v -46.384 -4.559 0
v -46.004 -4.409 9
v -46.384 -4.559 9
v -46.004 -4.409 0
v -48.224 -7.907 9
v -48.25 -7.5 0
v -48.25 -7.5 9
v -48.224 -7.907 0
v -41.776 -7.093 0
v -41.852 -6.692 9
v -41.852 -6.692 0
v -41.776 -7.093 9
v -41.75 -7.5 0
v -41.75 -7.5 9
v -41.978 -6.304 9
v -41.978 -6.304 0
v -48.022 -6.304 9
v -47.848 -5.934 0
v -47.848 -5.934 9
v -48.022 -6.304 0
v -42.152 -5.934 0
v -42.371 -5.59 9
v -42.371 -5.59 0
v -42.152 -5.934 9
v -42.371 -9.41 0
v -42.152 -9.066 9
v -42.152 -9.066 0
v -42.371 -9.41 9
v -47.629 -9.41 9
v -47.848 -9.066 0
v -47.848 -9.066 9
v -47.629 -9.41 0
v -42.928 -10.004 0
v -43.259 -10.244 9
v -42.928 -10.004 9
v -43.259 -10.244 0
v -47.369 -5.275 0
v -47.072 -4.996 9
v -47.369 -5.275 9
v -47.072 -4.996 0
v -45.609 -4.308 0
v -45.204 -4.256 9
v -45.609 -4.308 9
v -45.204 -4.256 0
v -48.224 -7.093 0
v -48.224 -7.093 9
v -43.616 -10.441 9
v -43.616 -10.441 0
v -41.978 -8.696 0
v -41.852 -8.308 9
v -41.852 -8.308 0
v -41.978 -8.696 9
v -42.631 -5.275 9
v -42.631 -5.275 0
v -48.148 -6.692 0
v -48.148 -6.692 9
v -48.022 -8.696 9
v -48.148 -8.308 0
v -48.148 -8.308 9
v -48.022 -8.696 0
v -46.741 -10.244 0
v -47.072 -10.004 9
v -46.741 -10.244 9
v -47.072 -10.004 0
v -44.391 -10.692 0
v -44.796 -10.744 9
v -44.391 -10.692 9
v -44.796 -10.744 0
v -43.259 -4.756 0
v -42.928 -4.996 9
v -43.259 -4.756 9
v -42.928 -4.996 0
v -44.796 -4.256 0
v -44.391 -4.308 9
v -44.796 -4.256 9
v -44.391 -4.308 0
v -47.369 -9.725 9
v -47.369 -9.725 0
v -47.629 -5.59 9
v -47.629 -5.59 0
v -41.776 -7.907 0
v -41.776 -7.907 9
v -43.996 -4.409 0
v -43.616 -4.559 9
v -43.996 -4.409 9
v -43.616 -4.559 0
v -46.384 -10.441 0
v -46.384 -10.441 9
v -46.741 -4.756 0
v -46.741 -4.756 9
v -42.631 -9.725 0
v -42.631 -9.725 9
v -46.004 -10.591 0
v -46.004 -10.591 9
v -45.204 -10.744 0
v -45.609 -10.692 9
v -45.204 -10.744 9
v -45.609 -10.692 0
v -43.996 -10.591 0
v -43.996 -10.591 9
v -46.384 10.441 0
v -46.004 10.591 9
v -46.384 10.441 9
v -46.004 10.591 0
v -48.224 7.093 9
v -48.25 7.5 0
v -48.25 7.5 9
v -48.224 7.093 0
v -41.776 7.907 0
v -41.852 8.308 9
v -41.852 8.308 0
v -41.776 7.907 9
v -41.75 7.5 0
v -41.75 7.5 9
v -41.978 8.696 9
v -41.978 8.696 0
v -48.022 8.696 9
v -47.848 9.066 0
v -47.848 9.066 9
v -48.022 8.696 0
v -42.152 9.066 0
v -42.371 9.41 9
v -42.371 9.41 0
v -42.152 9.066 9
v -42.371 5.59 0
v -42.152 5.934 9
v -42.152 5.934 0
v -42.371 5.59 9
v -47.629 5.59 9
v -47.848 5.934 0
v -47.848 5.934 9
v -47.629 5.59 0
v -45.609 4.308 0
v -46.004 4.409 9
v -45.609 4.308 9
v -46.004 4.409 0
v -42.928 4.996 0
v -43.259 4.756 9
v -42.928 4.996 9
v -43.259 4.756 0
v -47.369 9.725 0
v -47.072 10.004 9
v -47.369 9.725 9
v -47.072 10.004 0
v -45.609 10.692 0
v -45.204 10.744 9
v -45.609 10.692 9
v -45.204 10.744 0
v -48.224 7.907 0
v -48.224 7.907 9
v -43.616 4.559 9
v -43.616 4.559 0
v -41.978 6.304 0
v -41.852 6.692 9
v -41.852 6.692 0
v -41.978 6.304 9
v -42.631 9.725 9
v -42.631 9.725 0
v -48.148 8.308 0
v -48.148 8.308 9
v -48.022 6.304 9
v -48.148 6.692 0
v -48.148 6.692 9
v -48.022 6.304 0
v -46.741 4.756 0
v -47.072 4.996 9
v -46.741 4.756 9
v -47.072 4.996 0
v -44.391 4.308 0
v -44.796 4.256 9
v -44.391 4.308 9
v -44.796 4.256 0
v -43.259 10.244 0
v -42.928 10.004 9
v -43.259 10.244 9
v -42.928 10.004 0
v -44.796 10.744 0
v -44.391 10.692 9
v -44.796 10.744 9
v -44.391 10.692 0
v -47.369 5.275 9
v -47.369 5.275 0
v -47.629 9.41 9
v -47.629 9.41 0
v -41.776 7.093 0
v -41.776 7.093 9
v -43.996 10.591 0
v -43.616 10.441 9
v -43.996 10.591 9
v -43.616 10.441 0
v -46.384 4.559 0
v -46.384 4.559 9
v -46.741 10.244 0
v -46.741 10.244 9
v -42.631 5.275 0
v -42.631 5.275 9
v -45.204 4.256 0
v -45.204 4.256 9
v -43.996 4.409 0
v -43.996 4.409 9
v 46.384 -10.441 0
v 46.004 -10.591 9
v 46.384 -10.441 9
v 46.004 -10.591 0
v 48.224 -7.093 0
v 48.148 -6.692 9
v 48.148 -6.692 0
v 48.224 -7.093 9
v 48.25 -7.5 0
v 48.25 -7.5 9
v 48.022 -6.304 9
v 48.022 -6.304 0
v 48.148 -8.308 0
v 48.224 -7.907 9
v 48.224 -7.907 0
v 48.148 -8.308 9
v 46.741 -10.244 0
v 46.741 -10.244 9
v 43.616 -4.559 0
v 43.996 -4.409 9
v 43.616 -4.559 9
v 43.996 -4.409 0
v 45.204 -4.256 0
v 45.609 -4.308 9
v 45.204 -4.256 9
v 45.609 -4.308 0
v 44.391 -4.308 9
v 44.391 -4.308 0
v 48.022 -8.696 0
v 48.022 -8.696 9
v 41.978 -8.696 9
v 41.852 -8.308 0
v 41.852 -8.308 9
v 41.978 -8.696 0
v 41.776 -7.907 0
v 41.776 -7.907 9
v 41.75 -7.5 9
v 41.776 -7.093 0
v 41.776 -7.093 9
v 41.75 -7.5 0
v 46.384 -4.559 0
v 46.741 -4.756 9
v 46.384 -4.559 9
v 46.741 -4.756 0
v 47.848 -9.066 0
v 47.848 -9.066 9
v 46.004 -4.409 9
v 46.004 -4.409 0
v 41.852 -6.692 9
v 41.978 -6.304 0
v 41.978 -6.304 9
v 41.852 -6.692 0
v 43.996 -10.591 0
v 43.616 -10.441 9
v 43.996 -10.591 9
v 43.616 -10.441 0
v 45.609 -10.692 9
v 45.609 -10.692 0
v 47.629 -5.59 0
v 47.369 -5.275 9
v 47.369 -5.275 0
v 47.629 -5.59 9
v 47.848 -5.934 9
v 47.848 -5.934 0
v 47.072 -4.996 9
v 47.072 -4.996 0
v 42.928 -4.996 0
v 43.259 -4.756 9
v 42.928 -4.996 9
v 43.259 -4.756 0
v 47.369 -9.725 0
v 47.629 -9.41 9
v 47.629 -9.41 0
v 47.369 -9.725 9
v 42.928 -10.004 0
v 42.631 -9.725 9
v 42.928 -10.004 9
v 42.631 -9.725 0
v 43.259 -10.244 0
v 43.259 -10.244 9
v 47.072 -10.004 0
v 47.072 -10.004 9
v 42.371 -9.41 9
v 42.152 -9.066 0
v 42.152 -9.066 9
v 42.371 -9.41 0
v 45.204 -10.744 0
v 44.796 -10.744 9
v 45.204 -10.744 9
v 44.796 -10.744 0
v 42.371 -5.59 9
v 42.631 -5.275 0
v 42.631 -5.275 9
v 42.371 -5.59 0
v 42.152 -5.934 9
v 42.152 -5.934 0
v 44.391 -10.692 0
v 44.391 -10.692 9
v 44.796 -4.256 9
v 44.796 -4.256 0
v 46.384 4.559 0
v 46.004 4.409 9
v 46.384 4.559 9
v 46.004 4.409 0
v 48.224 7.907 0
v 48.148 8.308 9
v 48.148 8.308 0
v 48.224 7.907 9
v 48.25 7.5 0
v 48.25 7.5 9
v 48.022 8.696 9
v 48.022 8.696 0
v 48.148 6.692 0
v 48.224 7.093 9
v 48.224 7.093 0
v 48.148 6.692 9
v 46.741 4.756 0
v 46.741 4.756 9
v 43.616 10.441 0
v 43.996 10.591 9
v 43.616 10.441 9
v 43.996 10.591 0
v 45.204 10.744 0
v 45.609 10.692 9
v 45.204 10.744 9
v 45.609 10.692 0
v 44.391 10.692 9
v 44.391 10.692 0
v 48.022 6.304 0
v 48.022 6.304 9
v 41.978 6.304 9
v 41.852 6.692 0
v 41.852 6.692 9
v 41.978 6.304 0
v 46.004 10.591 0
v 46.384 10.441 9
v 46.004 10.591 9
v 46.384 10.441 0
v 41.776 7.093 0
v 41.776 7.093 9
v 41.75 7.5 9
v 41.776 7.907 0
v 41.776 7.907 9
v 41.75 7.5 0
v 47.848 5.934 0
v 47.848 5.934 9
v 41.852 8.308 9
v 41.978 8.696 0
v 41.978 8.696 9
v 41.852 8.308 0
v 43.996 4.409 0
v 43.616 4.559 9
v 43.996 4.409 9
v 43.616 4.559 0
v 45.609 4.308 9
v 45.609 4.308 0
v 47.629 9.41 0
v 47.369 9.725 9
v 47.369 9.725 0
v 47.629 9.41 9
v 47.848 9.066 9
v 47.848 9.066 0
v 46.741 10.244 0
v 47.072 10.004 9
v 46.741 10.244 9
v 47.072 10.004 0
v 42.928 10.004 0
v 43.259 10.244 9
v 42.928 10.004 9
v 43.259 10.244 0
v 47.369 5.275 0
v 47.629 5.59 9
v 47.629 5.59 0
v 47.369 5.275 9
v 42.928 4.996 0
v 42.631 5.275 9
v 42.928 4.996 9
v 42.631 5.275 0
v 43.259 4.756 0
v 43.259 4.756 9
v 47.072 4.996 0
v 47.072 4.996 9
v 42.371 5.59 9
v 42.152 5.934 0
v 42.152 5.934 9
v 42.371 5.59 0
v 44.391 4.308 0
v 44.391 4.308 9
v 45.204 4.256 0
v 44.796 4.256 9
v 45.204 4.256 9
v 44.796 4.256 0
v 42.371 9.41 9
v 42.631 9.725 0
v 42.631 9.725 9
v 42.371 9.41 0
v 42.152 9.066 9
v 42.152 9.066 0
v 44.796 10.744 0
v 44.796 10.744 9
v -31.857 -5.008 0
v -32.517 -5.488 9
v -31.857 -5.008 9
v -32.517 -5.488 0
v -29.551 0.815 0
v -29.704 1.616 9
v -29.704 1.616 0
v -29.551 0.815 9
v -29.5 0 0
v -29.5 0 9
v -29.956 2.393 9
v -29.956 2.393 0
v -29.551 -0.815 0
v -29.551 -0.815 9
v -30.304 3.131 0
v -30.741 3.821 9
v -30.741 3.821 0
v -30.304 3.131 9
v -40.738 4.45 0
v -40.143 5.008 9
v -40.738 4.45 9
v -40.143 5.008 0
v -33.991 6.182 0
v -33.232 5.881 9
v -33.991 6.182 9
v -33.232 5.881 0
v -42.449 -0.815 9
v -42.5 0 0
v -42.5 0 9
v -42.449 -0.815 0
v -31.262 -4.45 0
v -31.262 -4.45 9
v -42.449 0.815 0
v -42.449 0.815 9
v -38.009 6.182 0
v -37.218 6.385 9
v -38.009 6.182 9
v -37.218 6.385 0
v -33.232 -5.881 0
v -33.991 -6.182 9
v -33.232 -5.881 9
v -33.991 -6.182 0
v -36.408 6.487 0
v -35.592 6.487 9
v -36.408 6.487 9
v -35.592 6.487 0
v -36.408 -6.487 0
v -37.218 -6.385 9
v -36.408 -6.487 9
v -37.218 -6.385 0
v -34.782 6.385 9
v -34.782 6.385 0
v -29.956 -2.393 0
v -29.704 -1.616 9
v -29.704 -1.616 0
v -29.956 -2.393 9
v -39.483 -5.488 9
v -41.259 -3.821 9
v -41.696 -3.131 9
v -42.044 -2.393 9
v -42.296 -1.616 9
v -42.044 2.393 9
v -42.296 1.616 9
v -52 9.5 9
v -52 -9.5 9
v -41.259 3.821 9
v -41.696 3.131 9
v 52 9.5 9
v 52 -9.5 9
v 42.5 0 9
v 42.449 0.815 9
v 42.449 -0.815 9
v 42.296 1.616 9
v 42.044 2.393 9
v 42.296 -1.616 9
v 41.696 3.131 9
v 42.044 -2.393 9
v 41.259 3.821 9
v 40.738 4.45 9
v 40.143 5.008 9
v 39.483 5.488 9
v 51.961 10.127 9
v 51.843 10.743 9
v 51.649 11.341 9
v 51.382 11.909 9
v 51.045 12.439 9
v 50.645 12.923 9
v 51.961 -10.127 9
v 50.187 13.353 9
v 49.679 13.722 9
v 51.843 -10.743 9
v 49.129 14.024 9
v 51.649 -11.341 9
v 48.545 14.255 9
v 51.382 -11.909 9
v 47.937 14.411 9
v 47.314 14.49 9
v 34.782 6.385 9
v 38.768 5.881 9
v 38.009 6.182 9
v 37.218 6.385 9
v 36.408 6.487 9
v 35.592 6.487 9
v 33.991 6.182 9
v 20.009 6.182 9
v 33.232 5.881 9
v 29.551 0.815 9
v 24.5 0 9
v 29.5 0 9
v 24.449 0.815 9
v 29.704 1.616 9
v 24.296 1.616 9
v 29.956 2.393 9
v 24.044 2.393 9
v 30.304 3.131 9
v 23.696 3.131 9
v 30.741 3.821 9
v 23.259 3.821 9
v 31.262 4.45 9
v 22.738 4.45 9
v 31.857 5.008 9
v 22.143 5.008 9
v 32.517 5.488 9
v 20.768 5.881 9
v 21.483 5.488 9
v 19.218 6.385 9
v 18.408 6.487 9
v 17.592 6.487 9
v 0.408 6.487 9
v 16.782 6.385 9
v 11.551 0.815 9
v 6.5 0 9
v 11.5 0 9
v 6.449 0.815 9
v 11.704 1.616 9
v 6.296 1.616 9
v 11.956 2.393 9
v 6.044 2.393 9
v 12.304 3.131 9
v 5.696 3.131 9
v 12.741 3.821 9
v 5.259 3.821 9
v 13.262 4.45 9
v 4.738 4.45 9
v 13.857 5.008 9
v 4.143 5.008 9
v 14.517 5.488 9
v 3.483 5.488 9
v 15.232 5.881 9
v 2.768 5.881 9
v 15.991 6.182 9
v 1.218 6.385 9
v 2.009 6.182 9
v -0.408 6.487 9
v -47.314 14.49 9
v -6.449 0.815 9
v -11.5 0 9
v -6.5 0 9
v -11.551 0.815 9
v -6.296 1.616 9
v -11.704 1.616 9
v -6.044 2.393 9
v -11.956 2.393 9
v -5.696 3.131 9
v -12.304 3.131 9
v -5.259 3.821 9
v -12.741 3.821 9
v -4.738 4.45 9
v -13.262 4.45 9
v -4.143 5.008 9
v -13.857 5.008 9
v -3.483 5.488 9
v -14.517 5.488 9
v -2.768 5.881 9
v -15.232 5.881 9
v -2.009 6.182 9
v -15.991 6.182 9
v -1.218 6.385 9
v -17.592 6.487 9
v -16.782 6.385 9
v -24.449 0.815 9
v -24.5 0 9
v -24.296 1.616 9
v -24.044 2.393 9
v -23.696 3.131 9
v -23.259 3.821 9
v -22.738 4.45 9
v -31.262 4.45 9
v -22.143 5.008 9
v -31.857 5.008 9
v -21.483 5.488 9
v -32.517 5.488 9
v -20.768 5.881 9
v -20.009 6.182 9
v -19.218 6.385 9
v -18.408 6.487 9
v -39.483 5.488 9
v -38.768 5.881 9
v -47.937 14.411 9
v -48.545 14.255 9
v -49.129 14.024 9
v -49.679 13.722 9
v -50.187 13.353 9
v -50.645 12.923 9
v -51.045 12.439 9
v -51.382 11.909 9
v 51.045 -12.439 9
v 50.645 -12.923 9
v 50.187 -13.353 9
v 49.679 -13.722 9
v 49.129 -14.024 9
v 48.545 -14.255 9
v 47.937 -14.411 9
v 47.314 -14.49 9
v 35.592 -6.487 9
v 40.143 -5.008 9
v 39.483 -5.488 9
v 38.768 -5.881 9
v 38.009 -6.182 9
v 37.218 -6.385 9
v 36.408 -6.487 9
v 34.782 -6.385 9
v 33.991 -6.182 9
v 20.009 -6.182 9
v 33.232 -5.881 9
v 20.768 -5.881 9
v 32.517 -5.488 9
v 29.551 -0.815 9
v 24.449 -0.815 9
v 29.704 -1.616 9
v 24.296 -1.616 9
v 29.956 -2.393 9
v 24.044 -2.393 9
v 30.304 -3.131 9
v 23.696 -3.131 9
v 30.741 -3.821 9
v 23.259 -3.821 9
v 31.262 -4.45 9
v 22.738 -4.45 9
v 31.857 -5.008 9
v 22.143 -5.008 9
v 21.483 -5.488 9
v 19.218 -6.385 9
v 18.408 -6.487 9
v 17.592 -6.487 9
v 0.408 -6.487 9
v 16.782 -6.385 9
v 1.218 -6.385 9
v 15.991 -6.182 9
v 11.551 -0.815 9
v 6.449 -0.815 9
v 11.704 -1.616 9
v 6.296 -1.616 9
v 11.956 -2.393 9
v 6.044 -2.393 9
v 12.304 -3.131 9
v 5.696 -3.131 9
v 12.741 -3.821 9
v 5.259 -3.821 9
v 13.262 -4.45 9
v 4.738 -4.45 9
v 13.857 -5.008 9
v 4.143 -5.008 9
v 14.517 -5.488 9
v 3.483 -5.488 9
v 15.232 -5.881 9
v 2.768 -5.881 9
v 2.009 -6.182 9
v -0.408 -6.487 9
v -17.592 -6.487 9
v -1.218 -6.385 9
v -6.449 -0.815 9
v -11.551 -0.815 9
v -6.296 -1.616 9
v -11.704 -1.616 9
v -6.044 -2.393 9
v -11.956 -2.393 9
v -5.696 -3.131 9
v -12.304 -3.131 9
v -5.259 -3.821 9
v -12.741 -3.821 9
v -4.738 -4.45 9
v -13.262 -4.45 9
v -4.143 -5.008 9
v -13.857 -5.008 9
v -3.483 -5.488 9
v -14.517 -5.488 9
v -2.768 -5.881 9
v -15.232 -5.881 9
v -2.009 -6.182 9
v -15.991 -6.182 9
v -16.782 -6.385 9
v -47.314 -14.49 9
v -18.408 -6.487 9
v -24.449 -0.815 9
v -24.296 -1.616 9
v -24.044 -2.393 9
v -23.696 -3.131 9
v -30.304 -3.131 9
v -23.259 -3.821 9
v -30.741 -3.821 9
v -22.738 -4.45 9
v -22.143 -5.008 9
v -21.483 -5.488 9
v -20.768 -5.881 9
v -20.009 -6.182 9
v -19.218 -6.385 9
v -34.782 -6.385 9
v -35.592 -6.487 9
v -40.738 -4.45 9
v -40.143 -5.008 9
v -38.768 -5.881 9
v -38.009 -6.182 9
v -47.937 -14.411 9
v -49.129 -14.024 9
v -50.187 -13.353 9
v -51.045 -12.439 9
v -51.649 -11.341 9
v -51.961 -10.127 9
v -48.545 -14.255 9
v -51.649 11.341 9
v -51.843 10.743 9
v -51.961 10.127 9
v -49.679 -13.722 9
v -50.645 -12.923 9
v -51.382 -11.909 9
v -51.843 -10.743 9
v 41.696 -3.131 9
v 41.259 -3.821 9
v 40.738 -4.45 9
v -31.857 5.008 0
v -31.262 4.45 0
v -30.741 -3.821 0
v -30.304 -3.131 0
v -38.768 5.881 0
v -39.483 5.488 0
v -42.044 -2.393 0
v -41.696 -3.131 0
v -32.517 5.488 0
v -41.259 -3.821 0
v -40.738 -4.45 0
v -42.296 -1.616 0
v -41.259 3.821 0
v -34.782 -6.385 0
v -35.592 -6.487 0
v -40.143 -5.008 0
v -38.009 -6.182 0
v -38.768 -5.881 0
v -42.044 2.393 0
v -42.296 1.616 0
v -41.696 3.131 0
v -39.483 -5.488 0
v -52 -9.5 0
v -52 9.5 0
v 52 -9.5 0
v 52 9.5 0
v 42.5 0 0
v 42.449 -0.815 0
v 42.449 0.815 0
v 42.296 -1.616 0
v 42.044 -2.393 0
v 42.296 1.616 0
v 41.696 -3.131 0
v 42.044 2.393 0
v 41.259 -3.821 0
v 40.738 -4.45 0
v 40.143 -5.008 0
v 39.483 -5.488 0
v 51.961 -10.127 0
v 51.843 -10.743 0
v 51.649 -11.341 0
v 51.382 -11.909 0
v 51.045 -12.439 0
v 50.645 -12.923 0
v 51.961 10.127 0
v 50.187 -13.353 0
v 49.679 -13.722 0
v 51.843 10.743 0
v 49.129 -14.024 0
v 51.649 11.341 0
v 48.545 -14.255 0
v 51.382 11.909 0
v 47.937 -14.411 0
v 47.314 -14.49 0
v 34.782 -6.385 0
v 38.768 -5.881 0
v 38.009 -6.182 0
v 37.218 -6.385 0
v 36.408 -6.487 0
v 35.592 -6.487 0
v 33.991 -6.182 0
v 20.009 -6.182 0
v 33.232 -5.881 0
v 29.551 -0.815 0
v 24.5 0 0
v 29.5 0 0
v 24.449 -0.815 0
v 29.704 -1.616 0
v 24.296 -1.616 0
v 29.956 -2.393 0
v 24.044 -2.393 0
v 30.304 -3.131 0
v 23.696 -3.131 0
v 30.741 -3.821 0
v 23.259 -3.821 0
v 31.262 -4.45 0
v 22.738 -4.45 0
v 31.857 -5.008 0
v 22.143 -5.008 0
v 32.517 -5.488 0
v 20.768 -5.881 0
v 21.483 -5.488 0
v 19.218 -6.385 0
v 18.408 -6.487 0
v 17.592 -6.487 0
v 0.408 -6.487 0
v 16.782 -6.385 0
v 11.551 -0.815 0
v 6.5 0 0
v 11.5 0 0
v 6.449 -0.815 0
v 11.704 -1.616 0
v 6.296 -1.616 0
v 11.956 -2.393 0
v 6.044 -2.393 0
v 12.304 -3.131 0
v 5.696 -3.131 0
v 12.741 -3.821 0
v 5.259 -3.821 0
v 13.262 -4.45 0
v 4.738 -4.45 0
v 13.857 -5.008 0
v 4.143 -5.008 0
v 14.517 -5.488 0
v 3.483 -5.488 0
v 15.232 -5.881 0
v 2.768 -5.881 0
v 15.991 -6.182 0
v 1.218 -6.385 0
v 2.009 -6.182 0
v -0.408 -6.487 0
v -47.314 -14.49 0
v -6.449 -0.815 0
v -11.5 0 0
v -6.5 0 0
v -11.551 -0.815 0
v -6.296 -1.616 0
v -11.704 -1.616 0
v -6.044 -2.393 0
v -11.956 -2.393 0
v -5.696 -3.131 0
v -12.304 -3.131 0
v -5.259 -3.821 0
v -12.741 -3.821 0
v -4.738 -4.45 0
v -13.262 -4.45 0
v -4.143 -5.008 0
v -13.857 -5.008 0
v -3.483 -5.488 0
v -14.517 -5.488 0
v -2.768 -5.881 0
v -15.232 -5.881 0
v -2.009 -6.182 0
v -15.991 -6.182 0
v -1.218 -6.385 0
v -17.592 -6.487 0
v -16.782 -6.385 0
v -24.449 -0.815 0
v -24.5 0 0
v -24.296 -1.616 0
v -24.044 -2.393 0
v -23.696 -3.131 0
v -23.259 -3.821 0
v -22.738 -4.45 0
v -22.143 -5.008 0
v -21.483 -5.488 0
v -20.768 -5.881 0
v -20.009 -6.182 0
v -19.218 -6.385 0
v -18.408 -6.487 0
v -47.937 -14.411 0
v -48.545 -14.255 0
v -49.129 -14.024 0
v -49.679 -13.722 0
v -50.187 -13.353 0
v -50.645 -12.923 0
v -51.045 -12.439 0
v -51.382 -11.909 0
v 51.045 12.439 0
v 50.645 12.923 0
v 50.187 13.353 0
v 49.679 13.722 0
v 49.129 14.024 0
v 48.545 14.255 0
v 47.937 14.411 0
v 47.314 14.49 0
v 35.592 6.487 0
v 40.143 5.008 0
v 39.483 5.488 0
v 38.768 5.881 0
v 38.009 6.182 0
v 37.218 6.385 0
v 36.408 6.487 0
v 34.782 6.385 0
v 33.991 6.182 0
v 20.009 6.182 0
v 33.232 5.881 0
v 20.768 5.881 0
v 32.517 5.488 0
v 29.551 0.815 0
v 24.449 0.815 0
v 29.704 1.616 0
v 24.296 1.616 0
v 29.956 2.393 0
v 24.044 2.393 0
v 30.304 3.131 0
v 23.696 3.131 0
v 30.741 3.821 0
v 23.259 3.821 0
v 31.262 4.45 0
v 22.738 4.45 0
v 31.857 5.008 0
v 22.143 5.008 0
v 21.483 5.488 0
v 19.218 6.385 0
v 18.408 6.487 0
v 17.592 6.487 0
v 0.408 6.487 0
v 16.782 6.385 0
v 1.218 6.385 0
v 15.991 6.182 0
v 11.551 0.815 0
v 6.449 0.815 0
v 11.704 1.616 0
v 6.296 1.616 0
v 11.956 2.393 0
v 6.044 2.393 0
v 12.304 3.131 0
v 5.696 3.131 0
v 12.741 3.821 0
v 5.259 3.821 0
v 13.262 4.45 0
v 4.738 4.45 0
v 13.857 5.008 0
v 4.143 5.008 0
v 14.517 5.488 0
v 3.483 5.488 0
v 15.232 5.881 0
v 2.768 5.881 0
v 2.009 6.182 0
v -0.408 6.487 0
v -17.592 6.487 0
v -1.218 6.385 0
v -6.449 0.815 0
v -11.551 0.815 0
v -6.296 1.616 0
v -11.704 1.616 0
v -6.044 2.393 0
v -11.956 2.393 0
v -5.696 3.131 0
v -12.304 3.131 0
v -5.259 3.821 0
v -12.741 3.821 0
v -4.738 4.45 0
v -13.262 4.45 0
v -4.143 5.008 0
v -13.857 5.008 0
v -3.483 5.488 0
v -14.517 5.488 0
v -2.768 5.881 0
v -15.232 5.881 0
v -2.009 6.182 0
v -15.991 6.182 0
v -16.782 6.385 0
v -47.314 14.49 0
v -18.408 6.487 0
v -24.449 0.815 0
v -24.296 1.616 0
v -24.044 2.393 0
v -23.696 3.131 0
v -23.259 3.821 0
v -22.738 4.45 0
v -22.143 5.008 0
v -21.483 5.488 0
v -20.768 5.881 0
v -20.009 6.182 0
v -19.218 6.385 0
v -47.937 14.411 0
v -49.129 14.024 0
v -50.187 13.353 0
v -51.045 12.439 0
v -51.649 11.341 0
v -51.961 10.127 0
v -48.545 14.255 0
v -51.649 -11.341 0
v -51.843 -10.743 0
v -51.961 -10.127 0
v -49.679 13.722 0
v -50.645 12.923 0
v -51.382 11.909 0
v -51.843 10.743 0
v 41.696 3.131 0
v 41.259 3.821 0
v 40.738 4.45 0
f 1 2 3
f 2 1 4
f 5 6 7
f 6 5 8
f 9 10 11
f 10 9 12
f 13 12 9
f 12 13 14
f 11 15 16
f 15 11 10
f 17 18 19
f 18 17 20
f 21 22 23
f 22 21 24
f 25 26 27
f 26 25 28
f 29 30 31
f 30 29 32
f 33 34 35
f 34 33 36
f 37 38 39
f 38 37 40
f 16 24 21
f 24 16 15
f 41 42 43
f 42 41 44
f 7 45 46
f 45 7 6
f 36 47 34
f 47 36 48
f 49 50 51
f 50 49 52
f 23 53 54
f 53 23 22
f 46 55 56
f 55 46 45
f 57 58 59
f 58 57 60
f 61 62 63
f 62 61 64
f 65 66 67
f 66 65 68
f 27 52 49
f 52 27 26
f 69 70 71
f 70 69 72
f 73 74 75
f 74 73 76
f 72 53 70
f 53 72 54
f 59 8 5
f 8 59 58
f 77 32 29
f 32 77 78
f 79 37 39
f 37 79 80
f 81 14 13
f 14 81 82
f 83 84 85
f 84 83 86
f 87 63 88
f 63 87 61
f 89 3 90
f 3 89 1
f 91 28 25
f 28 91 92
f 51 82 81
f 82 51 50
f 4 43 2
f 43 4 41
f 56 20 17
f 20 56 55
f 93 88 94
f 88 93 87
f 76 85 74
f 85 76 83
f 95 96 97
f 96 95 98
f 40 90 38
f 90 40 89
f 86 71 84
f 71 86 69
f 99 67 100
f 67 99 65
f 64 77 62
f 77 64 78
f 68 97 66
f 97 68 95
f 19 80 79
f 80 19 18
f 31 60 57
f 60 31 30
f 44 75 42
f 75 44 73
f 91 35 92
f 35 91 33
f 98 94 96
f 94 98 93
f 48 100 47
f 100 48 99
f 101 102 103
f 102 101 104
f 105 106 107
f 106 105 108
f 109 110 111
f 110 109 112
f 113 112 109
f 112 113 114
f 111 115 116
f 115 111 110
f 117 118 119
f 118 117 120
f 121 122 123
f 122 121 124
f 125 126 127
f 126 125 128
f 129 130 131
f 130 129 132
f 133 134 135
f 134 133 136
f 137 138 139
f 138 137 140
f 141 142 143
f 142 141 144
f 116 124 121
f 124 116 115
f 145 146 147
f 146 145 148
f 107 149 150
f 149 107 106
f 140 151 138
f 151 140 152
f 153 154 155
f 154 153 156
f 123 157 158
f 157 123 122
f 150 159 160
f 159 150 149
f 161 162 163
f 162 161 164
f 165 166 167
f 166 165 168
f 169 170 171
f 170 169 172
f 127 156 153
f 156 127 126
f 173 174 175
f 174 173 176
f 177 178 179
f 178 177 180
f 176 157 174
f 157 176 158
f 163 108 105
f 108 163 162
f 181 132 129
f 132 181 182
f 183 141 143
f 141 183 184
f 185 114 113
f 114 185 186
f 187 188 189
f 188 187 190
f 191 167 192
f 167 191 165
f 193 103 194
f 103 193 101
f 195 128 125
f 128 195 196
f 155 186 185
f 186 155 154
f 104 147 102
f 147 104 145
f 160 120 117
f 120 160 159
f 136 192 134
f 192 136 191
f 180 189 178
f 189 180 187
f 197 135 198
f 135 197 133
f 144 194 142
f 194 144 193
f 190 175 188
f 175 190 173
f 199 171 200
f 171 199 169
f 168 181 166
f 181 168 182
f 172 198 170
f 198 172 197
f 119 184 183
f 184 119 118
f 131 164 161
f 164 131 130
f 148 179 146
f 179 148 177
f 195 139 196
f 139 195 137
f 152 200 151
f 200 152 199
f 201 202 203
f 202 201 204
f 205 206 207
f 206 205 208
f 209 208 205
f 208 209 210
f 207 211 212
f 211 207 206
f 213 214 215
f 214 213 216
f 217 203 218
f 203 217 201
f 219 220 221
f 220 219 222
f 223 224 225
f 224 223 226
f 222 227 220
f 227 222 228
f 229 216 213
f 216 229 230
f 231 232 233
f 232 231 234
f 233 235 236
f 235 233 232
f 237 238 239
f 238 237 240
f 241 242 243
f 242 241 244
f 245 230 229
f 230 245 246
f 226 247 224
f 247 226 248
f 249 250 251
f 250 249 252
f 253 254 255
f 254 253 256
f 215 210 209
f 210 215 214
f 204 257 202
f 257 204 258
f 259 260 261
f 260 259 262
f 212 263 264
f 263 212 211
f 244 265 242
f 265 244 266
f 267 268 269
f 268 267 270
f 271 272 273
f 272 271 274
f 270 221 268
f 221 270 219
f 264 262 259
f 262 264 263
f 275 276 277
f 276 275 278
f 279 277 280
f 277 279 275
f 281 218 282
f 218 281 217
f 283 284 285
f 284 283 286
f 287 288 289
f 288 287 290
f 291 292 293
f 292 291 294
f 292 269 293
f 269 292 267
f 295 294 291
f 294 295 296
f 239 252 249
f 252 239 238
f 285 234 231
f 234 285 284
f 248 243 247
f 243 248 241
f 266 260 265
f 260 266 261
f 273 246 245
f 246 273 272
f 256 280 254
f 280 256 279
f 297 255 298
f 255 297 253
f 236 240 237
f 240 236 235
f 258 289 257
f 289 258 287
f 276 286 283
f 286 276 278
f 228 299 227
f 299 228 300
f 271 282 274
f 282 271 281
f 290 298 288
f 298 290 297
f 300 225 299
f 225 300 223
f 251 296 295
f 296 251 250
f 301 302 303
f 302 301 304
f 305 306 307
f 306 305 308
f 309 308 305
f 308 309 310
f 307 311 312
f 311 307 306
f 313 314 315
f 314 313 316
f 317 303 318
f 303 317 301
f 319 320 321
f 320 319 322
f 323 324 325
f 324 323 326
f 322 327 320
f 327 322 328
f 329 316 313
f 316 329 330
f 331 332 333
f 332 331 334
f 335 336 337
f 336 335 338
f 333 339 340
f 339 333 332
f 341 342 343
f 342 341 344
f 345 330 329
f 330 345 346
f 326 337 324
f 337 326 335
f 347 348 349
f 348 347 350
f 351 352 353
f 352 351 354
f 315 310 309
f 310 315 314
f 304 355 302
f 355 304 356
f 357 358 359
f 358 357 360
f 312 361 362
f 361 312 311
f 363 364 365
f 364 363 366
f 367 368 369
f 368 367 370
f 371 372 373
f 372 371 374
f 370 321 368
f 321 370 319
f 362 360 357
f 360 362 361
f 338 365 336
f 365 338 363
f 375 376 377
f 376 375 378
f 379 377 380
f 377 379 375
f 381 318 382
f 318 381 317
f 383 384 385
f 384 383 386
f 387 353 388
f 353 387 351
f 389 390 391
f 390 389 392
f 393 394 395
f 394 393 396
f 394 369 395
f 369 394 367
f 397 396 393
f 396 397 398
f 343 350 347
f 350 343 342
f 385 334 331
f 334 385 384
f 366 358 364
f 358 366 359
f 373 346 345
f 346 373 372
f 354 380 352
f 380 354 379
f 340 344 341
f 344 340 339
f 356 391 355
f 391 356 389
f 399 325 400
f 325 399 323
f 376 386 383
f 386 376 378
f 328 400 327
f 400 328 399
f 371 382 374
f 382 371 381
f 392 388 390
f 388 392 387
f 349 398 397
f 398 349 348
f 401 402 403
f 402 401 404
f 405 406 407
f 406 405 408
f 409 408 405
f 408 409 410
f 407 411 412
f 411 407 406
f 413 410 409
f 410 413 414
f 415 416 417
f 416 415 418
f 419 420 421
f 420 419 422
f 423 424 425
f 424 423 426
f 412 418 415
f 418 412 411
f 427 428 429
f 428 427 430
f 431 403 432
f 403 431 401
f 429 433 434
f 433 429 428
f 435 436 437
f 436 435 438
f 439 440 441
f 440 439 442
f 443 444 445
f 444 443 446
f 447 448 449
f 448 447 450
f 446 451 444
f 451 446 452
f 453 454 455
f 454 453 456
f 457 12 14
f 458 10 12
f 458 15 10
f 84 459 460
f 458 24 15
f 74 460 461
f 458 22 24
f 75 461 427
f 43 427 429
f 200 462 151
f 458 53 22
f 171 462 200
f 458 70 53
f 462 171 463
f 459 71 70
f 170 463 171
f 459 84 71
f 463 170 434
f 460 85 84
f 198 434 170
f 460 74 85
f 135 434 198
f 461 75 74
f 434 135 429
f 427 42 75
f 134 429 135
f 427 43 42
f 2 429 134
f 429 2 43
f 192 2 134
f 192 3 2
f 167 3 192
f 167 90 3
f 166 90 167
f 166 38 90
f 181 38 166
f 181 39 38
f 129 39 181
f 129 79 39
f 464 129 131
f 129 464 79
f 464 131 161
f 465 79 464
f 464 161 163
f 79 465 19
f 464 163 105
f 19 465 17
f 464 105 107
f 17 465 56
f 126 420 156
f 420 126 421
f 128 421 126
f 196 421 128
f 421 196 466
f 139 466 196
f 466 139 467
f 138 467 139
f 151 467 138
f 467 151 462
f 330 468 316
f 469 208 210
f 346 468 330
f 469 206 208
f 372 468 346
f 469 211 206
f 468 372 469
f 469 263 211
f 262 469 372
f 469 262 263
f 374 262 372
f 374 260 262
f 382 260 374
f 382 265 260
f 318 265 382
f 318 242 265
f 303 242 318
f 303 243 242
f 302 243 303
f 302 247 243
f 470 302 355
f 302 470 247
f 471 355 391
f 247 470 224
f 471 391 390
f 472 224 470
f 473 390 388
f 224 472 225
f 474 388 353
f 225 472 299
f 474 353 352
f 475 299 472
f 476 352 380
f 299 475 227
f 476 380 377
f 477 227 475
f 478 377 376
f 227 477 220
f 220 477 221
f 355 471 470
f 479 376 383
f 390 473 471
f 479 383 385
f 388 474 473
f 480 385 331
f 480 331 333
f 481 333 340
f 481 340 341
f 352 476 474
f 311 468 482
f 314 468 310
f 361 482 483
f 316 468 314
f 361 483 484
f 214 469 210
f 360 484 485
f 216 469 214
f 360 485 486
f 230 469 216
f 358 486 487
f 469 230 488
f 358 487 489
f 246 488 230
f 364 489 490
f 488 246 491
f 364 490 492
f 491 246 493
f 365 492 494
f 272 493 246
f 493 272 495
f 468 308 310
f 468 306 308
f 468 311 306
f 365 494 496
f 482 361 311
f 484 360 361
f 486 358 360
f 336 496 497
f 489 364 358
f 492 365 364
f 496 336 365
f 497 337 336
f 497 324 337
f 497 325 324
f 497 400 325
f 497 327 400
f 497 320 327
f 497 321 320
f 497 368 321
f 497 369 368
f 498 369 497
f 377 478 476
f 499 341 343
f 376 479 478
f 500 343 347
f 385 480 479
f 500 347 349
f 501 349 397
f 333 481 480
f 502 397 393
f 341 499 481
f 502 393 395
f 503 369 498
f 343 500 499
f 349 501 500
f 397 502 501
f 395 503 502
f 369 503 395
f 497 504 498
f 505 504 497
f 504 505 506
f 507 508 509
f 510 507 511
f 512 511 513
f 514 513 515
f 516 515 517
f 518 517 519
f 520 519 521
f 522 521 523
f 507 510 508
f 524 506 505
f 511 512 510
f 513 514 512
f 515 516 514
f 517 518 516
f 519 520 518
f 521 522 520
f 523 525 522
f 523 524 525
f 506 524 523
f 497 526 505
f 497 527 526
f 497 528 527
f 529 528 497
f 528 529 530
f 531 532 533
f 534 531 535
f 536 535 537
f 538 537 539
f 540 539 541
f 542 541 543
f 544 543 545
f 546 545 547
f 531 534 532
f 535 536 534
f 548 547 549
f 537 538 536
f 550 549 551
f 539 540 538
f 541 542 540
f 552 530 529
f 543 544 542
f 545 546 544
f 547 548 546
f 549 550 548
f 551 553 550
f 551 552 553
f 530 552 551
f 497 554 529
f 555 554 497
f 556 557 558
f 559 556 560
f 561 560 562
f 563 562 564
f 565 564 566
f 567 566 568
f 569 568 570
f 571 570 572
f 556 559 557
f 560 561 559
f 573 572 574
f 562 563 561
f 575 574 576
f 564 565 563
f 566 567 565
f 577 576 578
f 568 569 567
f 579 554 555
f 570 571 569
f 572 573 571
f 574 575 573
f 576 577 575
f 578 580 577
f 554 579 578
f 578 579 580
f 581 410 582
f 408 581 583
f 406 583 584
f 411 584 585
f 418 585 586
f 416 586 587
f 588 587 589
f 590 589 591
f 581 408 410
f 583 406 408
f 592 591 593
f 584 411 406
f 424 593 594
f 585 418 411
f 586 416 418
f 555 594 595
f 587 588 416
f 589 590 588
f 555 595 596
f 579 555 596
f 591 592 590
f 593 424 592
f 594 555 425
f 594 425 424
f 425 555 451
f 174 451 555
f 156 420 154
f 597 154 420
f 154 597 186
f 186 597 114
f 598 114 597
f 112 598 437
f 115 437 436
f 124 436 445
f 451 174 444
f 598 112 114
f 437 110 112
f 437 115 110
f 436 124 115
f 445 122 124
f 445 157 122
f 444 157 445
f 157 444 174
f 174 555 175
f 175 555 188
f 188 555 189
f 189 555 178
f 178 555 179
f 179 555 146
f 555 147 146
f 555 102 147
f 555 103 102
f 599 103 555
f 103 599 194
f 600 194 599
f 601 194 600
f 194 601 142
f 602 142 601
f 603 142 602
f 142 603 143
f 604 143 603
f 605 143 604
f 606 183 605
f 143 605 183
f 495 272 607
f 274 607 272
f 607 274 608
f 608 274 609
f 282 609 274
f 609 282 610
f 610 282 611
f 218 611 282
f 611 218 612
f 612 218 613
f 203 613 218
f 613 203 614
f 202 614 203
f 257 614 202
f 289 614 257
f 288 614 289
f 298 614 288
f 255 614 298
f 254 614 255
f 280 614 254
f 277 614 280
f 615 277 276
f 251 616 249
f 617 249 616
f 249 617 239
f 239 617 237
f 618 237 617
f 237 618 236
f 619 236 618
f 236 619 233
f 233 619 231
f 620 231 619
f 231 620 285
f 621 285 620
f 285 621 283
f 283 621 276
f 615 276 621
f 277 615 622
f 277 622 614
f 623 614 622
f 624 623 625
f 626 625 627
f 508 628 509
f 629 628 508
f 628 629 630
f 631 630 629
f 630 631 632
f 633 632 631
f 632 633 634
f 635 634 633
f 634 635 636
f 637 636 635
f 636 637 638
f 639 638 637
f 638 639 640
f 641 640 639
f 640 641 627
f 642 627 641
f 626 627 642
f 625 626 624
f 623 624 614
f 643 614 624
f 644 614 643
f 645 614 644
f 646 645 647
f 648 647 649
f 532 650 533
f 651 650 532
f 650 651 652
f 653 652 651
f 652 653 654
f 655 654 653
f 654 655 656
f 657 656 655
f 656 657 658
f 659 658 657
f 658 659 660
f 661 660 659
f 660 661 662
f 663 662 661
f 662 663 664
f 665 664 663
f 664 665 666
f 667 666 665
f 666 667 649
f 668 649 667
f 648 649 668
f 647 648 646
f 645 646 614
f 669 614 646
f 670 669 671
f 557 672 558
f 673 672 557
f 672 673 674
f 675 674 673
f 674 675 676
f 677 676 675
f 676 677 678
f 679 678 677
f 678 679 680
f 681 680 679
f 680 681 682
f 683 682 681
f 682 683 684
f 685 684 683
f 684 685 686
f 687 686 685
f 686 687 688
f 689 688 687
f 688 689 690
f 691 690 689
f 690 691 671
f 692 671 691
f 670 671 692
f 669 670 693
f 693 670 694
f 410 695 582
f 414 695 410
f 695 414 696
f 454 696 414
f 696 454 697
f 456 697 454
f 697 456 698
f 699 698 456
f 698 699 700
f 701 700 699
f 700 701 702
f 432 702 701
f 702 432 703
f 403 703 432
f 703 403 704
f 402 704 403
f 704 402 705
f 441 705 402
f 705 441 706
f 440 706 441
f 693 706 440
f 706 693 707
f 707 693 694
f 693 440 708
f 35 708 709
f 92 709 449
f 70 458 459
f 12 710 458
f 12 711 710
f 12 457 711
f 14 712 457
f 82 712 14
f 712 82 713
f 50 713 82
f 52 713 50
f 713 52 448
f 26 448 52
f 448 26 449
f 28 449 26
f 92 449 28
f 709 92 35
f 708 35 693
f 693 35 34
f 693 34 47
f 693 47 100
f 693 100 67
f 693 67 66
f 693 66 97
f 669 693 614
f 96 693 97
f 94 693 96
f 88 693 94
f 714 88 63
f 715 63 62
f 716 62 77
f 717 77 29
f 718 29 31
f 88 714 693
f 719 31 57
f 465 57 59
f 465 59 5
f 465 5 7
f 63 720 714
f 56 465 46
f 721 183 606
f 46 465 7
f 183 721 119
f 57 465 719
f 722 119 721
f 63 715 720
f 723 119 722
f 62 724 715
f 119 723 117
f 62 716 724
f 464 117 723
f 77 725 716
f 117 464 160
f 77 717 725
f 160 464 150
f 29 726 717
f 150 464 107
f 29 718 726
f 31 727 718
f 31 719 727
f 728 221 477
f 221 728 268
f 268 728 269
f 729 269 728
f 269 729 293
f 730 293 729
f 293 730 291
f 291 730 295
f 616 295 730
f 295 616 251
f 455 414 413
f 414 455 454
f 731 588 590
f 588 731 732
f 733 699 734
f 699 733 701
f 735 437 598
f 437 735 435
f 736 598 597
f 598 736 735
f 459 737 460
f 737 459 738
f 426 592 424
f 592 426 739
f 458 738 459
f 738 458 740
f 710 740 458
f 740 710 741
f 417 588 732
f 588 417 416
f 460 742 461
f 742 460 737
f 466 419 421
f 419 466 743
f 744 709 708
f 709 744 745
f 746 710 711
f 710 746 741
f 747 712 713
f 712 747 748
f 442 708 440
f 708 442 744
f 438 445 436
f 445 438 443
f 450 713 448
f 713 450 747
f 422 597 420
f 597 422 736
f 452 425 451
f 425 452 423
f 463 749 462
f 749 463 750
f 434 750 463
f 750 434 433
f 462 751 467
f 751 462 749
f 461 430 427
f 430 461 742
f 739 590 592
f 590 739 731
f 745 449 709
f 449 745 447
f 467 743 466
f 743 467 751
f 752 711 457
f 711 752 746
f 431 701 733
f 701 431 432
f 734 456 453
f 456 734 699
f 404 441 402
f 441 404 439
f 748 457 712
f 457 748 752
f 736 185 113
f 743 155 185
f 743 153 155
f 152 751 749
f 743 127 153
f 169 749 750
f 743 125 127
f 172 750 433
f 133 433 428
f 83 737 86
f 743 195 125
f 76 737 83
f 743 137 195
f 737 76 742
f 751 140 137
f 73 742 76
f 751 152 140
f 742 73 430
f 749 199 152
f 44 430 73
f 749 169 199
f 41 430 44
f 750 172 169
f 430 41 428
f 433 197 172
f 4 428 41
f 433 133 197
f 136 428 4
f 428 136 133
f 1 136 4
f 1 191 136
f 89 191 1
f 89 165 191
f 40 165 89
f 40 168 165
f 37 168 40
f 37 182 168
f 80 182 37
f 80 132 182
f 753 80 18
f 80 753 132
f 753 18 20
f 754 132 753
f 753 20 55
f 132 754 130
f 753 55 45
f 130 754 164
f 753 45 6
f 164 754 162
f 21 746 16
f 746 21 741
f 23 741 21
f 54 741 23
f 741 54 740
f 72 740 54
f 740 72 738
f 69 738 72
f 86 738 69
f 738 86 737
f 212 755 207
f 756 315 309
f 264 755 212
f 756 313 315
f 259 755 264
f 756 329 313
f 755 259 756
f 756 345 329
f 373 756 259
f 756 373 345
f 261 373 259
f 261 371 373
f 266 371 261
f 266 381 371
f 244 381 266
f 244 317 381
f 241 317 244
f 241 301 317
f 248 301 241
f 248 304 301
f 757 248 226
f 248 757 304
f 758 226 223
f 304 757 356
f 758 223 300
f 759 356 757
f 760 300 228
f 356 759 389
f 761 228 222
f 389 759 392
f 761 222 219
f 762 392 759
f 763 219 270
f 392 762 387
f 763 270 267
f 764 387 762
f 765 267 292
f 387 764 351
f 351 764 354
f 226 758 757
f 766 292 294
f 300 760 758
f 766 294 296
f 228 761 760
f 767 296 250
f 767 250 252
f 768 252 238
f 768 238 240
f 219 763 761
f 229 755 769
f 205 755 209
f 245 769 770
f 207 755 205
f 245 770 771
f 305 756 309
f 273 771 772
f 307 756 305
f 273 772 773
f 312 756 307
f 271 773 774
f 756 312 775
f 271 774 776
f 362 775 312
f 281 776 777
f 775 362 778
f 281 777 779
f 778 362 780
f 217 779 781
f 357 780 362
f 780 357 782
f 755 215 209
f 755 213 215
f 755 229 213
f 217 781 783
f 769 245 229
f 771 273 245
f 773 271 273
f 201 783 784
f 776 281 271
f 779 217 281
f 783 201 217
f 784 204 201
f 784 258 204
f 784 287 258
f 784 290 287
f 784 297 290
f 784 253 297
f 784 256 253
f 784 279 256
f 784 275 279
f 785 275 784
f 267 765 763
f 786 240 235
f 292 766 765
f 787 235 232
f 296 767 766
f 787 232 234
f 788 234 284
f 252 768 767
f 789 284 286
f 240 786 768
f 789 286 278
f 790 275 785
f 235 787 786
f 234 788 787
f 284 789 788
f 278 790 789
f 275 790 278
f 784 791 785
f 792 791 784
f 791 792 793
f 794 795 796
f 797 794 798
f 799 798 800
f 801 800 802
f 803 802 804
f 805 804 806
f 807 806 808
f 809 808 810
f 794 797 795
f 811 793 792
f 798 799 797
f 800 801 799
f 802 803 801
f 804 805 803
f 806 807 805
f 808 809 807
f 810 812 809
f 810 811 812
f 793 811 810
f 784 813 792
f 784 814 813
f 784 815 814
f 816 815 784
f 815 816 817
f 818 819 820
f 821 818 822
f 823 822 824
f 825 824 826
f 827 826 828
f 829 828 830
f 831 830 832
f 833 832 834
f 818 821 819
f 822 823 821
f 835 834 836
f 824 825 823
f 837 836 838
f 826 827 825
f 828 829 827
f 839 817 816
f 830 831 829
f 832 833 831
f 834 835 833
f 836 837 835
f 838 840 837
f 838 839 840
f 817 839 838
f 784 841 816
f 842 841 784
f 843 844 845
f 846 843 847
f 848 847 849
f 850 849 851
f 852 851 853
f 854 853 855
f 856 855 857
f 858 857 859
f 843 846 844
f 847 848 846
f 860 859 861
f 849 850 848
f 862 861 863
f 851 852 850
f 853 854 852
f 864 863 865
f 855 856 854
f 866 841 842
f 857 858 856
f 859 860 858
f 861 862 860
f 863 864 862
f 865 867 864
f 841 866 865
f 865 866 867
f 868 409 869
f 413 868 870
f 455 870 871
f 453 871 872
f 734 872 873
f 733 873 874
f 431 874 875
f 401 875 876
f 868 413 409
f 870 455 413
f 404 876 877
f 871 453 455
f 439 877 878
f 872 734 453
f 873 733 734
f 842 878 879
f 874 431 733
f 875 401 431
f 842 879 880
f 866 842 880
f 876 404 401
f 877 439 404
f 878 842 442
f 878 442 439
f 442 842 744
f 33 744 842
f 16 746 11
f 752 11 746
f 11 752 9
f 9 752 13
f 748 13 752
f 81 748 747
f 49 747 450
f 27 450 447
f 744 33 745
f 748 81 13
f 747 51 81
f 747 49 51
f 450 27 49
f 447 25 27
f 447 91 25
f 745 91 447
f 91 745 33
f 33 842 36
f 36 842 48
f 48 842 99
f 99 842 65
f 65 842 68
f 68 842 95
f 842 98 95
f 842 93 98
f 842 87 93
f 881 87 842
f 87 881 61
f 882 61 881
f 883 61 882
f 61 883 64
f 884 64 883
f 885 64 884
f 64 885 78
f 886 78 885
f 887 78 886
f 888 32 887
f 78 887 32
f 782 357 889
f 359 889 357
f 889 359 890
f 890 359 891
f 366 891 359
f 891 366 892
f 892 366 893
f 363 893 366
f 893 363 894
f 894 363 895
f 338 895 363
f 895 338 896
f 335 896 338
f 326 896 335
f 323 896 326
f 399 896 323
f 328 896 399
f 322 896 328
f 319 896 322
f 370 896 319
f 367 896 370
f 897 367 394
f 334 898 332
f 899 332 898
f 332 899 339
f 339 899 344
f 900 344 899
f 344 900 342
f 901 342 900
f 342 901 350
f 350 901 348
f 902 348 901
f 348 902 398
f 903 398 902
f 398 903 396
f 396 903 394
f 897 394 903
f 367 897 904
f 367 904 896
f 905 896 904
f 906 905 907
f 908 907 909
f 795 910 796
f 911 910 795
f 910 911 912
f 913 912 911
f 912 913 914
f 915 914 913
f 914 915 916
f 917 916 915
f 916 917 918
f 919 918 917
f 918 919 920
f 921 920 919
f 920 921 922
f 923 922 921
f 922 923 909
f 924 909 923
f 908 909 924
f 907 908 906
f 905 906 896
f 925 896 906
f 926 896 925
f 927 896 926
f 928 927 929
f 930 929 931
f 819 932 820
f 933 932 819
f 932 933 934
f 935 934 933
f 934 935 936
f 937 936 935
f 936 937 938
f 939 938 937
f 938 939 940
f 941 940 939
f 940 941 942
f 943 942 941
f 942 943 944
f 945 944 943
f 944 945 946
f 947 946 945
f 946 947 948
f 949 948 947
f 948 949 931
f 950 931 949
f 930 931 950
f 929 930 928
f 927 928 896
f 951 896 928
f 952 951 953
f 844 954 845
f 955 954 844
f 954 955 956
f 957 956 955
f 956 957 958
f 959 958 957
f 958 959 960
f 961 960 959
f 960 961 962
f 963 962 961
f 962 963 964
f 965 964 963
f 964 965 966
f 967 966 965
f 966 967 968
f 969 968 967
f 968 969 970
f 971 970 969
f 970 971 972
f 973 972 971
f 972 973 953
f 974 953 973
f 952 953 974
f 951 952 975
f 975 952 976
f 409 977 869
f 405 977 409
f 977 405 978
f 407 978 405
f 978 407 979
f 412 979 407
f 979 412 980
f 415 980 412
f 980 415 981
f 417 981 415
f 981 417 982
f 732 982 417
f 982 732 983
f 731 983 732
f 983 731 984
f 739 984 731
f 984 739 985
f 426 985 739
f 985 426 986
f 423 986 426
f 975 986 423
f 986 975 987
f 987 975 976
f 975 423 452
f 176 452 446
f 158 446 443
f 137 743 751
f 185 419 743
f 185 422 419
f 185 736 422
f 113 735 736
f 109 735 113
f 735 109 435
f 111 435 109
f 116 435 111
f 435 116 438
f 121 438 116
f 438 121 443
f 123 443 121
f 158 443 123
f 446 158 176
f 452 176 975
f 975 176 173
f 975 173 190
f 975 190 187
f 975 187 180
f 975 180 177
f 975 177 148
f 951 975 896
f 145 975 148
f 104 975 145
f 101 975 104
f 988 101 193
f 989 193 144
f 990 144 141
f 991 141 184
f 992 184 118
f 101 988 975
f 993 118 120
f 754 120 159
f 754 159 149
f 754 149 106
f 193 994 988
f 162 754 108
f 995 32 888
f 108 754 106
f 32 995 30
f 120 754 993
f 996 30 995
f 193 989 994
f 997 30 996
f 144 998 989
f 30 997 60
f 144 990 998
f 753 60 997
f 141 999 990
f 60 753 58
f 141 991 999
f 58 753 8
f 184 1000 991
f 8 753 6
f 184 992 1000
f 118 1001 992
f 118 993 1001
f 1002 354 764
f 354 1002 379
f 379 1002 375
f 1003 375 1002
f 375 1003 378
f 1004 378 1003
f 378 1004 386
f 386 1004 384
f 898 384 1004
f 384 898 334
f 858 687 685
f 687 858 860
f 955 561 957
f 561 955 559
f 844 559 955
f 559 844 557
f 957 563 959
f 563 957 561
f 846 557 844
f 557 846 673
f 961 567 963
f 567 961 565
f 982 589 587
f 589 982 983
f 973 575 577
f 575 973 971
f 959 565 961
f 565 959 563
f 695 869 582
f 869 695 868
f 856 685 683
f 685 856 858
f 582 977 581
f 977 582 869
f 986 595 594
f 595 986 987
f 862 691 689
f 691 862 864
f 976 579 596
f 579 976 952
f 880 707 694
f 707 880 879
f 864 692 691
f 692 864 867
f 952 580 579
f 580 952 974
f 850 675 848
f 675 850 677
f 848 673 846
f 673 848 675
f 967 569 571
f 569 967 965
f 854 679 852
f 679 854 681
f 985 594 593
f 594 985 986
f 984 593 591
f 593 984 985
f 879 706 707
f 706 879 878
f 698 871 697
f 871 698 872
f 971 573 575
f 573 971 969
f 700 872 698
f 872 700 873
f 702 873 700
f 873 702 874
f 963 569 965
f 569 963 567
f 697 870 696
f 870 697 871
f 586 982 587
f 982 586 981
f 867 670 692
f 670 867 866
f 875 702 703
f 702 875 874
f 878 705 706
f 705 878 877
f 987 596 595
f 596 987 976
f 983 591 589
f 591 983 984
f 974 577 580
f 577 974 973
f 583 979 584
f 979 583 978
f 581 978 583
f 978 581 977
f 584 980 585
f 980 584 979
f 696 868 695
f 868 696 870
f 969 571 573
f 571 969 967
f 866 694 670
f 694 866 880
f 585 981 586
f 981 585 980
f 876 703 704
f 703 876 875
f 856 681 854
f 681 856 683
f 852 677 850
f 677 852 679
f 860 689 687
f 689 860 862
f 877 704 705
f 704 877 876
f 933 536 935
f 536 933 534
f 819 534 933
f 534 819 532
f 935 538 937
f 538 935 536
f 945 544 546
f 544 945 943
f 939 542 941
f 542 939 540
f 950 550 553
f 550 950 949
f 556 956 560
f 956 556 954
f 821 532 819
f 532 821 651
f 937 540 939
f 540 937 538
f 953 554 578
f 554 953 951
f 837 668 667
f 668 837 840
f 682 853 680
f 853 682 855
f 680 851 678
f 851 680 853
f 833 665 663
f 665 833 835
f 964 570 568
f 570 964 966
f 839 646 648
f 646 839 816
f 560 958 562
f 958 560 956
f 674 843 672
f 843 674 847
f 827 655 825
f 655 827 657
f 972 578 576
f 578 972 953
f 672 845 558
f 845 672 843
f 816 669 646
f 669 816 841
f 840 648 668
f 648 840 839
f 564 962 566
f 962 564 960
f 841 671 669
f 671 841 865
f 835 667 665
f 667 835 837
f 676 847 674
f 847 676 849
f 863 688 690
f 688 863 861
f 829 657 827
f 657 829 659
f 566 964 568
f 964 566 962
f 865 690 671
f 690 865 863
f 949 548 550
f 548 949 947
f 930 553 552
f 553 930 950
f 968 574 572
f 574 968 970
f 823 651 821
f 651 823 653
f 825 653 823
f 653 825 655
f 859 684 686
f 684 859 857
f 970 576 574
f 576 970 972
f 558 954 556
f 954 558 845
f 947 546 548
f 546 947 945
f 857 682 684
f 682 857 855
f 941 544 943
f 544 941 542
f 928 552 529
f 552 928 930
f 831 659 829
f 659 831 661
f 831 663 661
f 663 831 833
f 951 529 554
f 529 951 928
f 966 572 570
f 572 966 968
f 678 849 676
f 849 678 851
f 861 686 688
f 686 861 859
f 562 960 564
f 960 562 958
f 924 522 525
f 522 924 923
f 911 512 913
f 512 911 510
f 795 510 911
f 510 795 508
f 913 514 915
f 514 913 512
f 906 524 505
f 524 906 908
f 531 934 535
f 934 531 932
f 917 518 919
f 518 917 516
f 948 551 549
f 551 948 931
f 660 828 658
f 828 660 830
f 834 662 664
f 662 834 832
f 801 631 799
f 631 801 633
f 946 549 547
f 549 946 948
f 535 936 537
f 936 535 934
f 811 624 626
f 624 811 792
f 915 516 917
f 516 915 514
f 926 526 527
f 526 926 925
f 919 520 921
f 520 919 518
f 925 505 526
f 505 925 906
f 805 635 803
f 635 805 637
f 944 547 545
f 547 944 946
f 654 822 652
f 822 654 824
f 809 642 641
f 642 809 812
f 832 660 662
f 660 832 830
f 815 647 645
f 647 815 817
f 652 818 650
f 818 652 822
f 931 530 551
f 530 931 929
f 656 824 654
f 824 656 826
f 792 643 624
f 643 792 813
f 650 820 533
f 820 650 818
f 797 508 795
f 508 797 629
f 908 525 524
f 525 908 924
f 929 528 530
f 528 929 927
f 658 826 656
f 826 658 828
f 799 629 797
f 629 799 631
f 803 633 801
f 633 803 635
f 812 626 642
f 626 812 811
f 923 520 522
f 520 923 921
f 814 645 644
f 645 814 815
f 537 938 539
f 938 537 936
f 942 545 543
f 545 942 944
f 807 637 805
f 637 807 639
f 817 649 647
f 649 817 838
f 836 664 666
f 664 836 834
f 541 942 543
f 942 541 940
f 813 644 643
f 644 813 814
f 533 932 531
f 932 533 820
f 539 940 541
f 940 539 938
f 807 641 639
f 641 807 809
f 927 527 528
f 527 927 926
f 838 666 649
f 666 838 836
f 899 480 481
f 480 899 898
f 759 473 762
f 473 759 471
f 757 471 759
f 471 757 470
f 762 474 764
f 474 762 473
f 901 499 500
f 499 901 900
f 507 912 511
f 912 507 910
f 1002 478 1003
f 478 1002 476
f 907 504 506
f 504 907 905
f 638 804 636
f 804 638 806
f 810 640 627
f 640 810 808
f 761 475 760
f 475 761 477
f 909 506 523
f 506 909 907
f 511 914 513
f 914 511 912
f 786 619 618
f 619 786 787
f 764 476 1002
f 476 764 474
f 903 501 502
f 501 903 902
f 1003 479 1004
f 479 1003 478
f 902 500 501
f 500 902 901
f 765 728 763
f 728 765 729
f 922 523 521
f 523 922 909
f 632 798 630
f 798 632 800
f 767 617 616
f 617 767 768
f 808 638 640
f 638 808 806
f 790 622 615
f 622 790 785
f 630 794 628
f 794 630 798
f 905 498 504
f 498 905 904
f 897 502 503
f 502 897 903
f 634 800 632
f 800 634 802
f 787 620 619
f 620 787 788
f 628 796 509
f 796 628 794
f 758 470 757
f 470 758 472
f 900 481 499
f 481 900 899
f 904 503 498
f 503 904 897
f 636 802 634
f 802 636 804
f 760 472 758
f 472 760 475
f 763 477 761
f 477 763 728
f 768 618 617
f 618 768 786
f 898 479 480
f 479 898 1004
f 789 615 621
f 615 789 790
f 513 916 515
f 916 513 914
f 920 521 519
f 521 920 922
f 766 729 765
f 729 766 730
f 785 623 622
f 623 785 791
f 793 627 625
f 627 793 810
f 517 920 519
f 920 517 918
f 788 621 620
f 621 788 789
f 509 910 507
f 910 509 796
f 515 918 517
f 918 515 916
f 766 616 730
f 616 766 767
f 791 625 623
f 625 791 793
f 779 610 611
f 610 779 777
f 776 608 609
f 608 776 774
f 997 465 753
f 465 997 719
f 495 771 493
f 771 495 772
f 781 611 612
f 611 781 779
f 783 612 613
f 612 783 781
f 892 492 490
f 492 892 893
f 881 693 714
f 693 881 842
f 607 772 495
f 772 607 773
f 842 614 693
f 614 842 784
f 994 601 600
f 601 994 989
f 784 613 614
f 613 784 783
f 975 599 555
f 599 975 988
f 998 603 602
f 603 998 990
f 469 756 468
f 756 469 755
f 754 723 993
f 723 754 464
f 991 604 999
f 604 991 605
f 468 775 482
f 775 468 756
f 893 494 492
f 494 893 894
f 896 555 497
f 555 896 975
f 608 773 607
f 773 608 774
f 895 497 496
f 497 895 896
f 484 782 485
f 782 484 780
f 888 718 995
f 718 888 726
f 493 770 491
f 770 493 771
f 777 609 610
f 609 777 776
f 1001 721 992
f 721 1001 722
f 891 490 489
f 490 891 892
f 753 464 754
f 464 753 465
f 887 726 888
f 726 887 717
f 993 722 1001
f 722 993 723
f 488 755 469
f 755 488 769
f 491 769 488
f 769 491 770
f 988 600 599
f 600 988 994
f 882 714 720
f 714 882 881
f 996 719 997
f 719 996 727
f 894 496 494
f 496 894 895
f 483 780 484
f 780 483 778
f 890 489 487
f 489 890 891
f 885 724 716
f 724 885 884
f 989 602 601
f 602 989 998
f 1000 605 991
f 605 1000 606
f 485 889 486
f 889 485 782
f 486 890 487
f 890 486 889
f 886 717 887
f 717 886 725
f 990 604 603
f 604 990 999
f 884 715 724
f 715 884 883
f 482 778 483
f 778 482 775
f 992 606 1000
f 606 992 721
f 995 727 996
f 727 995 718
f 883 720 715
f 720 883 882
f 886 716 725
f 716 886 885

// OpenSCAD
$fn = 50;


difference() {
	union() {
		hull() {
			translate(v = [-47.0000000000, 9.5000000000, 0]) {
				cylinder(h = 9, r = 5);
			}
			translate(v = [47.0000000000, 9.5000000000, 0]) {
				cylinder(h = 9, r = 5);
			}
			translate(v = [-47.0000000000, -9.5000000000, 0]) {
				cylinder(h = 9, r = 5);
			}
			translate(v = [47.0000000000, -9.5000000000, 0]) {
				cylinder(h = 9, r = 5);
			}
		}
	}
	union() {
		#translate(v = [-45.0000000000, -7.5000000000, -100.0000000000]) {
			cylinder(h = 200, r = 3.2500000000);
		}
		#translate(v = [-45.0000000000, 7.5000000000, -100.0000000000]) {
			cylinder(h = 200, r = 3.2500000000);
		}
		#translate(v = [45.0000000000, -7.5000000000, -100.0000000000]) {
			cylinder(h = 200, r = 3.2500000000);
		}
		#translate(v = [45.0000000000, 7.5000000000, -100.0000000000]) {
			cylinder(h = 200, r = 3.2500000000);
		}
		#translate(v = [-36.0000000000, 0, 0]) {
			cylinder(h = 9, r = 6.5000000000);
		}
		#translate(v = [-18.0000000000, 0, 0]) {
			cylinder(h = 9, r = 6.5000000000);
		}
		#cylinder(h = 9, r = 6.5000000000);
		#translate(v = [18.0000000000, 0, 0]) {
			cylinder(h = 9, r = 6.5000000000);
		}
		#translate(v = [36.0000000000, 0, 0]) {
			cylinder(h = 9, r = 6.5000000000);
		}
	}
}
